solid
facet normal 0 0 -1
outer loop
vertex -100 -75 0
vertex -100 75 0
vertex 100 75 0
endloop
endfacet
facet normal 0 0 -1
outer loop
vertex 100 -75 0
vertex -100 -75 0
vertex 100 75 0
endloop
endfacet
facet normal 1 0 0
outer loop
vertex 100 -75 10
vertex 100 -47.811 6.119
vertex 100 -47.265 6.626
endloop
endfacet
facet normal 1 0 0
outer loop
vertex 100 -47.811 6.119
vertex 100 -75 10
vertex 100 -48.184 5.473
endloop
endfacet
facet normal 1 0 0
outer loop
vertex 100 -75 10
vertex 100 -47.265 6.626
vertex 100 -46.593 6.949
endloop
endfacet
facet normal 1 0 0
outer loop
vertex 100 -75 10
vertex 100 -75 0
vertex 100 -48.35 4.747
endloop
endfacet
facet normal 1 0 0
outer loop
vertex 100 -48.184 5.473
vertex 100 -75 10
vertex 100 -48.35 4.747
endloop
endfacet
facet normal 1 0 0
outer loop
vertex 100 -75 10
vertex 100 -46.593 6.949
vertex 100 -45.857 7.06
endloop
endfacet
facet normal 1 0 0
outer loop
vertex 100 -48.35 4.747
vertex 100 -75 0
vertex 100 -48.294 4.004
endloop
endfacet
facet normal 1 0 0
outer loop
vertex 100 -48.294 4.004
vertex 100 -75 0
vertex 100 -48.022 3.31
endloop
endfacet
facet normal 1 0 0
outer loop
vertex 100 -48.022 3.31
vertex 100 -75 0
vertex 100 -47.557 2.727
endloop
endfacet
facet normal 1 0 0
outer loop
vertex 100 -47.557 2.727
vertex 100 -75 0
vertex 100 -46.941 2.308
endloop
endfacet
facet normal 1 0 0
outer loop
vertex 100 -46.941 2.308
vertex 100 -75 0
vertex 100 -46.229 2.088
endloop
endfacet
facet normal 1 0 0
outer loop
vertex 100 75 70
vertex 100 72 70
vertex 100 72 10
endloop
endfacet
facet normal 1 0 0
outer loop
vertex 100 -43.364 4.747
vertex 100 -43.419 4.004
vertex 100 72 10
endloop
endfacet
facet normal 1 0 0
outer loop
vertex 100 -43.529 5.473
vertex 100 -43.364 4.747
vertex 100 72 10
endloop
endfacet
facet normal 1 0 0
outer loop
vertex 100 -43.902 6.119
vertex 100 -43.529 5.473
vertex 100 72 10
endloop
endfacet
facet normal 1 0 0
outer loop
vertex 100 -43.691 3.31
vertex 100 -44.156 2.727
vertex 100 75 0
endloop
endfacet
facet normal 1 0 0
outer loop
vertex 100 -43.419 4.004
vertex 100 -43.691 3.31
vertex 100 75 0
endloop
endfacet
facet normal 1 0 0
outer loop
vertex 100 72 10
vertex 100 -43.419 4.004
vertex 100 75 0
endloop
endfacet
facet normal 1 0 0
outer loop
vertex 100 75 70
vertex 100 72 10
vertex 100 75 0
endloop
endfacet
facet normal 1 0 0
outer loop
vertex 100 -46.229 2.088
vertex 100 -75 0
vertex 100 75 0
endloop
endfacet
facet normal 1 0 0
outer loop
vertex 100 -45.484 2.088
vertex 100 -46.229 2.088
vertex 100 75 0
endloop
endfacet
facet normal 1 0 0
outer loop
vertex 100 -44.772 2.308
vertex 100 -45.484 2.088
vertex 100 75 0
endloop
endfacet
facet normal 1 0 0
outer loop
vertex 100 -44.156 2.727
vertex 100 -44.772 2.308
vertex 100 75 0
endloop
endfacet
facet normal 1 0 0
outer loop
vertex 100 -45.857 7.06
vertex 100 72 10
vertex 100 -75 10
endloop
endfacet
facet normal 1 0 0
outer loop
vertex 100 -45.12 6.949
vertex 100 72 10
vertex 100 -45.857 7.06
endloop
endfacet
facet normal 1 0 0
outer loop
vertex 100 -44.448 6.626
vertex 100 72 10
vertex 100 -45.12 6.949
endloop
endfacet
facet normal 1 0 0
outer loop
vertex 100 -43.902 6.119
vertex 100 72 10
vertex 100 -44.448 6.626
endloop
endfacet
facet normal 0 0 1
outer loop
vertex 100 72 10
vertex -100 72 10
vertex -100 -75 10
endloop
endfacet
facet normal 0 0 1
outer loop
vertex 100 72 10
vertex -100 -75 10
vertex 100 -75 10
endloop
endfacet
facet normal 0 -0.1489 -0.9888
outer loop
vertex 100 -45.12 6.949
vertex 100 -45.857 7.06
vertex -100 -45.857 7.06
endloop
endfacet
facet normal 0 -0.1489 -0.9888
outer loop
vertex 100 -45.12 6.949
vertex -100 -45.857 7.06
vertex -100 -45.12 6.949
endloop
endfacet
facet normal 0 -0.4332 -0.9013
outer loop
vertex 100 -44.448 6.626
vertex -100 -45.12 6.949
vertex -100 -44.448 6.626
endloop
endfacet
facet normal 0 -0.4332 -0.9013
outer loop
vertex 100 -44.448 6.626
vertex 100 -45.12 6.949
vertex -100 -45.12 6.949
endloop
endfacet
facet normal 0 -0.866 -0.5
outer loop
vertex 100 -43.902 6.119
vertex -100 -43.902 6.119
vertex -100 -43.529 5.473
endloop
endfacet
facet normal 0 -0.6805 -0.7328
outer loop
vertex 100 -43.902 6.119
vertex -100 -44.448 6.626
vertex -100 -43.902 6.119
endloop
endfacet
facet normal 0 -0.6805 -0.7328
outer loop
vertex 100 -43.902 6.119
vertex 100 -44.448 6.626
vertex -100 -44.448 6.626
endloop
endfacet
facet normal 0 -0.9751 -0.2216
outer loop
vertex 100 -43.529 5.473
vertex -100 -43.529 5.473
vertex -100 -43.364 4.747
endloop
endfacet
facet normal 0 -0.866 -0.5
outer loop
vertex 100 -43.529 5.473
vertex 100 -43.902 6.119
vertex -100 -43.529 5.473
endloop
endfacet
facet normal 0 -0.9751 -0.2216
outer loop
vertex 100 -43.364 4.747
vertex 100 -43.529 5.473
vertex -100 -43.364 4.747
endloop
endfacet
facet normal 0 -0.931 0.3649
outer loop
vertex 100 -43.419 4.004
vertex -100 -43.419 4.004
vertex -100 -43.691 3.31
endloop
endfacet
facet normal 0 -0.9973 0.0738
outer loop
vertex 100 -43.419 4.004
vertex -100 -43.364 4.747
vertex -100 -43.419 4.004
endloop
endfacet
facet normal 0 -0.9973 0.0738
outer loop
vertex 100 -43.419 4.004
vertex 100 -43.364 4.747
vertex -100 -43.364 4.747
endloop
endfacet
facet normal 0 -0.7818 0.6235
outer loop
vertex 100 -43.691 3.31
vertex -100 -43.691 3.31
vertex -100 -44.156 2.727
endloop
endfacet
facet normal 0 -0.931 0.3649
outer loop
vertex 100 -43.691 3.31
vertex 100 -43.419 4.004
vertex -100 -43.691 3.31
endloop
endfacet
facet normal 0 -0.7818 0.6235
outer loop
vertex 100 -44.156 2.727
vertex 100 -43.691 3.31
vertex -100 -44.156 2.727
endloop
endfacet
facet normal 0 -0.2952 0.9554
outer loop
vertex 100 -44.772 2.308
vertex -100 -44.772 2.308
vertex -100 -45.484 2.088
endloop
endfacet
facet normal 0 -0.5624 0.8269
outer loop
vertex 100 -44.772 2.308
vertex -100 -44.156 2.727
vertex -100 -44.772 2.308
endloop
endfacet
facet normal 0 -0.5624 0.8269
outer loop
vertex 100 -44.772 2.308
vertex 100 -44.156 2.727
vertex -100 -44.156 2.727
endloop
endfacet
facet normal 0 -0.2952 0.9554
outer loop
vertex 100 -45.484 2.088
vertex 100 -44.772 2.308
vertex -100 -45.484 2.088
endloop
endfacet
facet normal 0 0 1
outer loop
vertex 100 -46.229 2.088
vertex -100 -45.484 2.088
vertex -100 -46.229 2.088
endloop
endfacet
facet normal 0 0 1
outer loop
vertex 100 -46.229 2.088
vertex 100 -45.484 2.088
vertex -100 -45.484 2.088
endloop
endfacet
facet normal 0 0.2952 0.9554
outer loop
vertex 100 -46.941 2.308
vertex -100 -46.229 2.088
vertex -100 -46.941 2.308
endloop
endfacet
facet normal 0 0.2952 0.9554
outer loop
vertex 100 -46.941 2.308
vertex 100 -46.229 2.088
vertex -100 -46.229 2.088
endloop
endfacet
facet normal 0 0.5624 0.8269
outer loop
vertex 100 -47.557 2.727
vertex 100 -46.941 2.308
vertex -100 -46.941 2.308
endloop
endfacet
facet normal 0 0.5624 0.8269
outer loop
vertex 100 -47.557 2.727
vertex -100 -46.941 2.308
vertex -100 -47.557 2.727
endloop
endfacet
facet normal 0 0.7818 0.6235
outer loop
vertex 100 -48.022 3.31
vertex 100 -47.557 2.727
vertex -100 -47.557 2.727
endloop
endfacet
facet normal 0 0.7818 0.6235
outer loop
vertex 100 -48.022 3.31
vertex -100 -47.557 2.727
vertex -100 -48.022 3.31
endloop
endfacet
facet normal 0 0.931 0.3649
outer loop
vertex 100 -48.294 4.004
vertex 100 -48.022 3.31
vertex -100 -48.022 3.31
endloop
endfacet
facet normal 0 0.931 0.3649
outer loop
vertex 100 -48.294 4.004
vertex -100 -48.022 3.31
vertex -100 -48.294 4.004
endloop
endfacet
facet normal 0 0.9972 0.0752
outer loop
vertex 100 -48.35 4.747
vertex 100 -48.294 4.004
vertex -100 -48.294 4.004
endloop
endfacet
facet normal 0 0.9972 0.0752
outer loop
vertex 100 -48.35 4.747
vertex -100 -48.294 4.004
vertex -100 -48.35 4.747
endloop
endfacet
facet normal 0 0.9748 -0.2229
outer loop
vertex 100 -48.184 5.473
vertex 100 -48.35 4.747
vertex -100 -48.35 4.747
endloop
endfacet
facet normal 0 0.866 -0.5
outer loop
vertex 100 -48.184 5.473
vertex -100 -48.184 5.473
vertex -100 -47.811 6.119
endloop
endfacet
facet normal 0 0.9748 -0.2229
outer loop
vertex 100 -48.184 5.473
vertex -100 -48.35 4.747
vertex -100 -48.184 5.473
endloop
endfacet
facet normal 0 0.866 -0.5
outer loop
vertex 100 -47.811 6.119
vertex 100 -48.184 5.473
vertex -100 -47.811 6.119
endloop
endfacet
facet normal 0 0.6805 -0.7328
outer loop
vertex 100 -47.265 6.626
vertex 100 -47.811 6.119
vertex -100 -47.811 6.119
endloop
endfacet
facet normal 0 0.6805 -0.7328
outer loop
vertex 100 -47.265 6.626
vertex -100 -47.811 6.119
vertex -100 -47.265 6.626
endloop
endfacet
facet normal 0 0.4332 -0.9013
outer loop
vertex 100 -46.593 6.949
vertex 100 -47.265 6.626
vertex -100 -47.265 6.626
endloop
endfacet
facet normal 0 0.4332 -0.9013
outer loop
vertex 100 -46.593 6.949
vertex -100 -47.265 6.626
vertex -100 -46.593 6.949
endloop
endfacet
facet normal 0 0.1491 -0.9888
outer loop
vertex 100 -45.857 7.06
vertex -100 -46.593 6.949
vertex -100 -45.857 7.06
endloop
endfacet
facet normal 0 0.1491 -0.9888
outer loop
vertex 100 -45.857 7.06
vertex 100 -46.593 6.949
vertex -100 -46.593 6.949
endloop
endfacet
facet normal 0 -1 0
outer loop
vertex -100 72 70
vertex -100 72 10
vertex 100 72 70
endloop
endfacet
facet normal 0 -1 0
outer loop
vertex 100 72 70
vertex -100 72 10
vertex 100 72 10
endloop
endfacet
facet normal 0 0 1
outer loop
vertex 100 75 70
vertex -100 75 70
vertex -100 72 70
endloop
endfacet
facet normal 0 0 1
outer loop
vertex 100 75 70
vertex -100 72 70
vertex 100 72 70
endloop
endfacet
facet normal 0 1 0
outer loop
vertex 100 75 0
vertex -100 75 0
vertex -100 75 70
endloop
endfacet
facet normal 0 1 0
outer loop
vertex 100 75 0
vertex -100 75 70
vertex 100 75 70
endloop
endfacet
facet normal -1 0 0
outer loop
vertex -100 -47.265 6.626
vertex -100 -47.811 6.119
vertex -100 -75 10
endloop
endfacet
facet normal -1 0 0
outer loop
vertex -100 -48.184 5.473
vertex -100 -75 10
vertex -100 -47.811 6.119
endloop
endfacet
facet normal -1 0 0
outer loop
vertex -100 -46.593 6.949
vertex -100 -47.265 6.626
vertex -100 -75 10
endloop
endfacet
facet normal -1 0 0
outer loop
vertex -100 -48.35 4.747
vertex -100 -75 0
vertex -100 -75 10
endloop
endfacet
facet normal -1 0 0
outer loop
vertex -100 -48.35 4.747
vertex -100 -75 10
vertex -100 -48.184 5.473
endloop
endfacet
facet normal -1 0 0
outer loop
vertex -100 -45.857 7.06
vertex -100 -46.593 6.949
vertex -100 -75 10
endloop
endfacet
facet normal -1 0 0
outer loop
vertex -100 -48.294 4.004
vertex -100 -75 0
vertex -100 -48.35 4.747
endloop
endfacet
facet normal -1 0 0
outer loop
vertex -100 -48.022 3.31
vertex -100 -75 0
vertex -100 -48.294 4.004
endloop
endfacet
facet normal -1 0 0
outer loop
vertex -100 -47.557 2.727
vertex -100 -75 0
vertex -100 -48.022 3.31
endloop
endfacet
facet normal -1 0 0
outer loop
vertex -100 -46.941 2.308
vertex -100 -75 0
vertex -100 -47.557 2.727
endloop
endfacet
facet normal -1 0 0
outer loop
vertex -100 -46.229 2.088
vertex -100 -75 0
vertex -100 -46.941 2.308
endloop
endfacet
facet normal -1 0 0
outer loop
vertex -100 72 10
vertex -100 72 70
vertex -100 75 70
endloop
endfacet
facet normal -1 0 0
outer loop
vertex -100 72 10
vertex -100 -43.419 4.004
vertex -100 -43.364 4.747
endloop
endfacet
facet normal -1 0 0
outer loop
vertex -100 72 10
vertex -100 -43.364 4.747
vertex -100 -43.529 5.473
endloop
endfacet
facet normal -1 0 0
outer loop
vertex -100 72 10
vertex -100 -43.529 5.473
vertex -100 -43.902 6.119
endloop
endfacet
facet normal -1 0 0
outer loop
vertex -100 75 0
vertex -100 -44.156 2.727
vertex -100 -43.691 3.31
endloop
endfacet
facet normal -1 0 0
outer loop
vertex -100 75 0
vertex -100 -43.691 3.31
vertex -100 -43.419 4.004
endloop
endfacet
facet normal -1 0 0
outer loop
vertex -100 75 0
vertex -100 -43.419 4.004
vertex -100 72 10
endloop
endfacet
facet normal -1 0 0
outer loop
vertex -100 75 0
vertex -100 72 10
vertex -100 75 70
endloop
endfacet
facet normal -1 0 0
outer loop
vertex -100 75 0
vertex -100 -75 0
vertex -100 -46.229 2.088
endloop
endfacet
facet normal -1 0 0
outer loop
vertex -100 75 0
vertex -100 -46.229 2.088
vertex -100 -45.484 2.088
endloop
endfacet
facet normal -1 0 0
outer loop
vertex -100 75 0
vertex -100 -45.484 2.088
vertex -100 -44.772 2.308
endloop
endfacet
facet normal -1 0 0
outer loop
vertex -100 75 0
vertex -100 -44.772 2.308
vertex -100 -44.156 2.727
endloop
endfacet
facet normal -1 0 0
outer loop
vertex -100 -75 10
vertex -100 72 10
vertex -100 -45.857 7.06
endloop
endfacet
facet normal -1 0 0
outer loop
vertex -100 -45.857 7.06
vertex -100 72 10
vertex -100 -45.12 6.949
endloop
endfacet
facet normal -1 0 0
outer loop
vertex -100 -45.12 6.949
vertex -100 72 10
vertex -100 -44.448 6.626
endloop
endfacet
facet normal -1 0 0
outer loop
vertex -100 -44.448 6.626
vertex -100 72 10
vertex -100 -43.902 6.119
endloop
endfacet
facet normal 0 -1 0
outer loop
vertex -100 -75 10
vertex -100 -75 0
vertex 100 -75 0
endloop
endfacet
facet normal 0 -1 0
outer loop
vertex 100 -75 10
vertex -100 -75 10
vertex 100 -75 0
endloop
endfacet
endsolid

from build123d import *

# Parameters (mm, degrees)
SKETCH1_W               = 200
SKETCH1_H               = 150
BOSS_EXTRUDE1_DEPTH     = 10
CUT_EXTRUDE1_DEPTH      = 214.834047803
CUT_EXTRUDE1_DEPTH_BACK = 214.834047803
SKETCH2_R               = 2.5
SKETCH3_W               = 200
SKETCH3_H               = 3
BOSS_EXTRUDE2_DEPTH     = 60


with BuildPart() as part:
    # Sketch1 → Boss-Extrude1 (new body)
    with BuildSketch(Plane.XY):
        Rectangle(SKETCH1_W, SKETCH1_H)
    extrude(amount=BOSS_EXTRUDE1_DEPTH)

    # Sketch2 → Cut-Extrude1 (cut, two sides: drawn at the far end of the back side and taken through both)
    with BuildSketch(Plane.ZY.offset(100).offset(-CUT_EXTRUDE1_DEPTH_BACK)):
        with Locations((4.560099843, -45.856552044)):
            Circle(SKETCH2_R)
    extrude(amount=CUT_EXTRUDE1_DEPTH + CUT_EXTRUDE1_DEPTH_BACK, mode=Mode.SUBTRACT)

    # Sketch3 → Boss-Extrude2 (add)
    with BuildSketch(Plane.XY.offset(10)):
        with Locations((0, 73.5)):
            Rectangle(SKETCH3_W, SKETCH3_H)
    extrude(amount=BOSS_EXTRUDE2_DEPTH)


solid = part.part
